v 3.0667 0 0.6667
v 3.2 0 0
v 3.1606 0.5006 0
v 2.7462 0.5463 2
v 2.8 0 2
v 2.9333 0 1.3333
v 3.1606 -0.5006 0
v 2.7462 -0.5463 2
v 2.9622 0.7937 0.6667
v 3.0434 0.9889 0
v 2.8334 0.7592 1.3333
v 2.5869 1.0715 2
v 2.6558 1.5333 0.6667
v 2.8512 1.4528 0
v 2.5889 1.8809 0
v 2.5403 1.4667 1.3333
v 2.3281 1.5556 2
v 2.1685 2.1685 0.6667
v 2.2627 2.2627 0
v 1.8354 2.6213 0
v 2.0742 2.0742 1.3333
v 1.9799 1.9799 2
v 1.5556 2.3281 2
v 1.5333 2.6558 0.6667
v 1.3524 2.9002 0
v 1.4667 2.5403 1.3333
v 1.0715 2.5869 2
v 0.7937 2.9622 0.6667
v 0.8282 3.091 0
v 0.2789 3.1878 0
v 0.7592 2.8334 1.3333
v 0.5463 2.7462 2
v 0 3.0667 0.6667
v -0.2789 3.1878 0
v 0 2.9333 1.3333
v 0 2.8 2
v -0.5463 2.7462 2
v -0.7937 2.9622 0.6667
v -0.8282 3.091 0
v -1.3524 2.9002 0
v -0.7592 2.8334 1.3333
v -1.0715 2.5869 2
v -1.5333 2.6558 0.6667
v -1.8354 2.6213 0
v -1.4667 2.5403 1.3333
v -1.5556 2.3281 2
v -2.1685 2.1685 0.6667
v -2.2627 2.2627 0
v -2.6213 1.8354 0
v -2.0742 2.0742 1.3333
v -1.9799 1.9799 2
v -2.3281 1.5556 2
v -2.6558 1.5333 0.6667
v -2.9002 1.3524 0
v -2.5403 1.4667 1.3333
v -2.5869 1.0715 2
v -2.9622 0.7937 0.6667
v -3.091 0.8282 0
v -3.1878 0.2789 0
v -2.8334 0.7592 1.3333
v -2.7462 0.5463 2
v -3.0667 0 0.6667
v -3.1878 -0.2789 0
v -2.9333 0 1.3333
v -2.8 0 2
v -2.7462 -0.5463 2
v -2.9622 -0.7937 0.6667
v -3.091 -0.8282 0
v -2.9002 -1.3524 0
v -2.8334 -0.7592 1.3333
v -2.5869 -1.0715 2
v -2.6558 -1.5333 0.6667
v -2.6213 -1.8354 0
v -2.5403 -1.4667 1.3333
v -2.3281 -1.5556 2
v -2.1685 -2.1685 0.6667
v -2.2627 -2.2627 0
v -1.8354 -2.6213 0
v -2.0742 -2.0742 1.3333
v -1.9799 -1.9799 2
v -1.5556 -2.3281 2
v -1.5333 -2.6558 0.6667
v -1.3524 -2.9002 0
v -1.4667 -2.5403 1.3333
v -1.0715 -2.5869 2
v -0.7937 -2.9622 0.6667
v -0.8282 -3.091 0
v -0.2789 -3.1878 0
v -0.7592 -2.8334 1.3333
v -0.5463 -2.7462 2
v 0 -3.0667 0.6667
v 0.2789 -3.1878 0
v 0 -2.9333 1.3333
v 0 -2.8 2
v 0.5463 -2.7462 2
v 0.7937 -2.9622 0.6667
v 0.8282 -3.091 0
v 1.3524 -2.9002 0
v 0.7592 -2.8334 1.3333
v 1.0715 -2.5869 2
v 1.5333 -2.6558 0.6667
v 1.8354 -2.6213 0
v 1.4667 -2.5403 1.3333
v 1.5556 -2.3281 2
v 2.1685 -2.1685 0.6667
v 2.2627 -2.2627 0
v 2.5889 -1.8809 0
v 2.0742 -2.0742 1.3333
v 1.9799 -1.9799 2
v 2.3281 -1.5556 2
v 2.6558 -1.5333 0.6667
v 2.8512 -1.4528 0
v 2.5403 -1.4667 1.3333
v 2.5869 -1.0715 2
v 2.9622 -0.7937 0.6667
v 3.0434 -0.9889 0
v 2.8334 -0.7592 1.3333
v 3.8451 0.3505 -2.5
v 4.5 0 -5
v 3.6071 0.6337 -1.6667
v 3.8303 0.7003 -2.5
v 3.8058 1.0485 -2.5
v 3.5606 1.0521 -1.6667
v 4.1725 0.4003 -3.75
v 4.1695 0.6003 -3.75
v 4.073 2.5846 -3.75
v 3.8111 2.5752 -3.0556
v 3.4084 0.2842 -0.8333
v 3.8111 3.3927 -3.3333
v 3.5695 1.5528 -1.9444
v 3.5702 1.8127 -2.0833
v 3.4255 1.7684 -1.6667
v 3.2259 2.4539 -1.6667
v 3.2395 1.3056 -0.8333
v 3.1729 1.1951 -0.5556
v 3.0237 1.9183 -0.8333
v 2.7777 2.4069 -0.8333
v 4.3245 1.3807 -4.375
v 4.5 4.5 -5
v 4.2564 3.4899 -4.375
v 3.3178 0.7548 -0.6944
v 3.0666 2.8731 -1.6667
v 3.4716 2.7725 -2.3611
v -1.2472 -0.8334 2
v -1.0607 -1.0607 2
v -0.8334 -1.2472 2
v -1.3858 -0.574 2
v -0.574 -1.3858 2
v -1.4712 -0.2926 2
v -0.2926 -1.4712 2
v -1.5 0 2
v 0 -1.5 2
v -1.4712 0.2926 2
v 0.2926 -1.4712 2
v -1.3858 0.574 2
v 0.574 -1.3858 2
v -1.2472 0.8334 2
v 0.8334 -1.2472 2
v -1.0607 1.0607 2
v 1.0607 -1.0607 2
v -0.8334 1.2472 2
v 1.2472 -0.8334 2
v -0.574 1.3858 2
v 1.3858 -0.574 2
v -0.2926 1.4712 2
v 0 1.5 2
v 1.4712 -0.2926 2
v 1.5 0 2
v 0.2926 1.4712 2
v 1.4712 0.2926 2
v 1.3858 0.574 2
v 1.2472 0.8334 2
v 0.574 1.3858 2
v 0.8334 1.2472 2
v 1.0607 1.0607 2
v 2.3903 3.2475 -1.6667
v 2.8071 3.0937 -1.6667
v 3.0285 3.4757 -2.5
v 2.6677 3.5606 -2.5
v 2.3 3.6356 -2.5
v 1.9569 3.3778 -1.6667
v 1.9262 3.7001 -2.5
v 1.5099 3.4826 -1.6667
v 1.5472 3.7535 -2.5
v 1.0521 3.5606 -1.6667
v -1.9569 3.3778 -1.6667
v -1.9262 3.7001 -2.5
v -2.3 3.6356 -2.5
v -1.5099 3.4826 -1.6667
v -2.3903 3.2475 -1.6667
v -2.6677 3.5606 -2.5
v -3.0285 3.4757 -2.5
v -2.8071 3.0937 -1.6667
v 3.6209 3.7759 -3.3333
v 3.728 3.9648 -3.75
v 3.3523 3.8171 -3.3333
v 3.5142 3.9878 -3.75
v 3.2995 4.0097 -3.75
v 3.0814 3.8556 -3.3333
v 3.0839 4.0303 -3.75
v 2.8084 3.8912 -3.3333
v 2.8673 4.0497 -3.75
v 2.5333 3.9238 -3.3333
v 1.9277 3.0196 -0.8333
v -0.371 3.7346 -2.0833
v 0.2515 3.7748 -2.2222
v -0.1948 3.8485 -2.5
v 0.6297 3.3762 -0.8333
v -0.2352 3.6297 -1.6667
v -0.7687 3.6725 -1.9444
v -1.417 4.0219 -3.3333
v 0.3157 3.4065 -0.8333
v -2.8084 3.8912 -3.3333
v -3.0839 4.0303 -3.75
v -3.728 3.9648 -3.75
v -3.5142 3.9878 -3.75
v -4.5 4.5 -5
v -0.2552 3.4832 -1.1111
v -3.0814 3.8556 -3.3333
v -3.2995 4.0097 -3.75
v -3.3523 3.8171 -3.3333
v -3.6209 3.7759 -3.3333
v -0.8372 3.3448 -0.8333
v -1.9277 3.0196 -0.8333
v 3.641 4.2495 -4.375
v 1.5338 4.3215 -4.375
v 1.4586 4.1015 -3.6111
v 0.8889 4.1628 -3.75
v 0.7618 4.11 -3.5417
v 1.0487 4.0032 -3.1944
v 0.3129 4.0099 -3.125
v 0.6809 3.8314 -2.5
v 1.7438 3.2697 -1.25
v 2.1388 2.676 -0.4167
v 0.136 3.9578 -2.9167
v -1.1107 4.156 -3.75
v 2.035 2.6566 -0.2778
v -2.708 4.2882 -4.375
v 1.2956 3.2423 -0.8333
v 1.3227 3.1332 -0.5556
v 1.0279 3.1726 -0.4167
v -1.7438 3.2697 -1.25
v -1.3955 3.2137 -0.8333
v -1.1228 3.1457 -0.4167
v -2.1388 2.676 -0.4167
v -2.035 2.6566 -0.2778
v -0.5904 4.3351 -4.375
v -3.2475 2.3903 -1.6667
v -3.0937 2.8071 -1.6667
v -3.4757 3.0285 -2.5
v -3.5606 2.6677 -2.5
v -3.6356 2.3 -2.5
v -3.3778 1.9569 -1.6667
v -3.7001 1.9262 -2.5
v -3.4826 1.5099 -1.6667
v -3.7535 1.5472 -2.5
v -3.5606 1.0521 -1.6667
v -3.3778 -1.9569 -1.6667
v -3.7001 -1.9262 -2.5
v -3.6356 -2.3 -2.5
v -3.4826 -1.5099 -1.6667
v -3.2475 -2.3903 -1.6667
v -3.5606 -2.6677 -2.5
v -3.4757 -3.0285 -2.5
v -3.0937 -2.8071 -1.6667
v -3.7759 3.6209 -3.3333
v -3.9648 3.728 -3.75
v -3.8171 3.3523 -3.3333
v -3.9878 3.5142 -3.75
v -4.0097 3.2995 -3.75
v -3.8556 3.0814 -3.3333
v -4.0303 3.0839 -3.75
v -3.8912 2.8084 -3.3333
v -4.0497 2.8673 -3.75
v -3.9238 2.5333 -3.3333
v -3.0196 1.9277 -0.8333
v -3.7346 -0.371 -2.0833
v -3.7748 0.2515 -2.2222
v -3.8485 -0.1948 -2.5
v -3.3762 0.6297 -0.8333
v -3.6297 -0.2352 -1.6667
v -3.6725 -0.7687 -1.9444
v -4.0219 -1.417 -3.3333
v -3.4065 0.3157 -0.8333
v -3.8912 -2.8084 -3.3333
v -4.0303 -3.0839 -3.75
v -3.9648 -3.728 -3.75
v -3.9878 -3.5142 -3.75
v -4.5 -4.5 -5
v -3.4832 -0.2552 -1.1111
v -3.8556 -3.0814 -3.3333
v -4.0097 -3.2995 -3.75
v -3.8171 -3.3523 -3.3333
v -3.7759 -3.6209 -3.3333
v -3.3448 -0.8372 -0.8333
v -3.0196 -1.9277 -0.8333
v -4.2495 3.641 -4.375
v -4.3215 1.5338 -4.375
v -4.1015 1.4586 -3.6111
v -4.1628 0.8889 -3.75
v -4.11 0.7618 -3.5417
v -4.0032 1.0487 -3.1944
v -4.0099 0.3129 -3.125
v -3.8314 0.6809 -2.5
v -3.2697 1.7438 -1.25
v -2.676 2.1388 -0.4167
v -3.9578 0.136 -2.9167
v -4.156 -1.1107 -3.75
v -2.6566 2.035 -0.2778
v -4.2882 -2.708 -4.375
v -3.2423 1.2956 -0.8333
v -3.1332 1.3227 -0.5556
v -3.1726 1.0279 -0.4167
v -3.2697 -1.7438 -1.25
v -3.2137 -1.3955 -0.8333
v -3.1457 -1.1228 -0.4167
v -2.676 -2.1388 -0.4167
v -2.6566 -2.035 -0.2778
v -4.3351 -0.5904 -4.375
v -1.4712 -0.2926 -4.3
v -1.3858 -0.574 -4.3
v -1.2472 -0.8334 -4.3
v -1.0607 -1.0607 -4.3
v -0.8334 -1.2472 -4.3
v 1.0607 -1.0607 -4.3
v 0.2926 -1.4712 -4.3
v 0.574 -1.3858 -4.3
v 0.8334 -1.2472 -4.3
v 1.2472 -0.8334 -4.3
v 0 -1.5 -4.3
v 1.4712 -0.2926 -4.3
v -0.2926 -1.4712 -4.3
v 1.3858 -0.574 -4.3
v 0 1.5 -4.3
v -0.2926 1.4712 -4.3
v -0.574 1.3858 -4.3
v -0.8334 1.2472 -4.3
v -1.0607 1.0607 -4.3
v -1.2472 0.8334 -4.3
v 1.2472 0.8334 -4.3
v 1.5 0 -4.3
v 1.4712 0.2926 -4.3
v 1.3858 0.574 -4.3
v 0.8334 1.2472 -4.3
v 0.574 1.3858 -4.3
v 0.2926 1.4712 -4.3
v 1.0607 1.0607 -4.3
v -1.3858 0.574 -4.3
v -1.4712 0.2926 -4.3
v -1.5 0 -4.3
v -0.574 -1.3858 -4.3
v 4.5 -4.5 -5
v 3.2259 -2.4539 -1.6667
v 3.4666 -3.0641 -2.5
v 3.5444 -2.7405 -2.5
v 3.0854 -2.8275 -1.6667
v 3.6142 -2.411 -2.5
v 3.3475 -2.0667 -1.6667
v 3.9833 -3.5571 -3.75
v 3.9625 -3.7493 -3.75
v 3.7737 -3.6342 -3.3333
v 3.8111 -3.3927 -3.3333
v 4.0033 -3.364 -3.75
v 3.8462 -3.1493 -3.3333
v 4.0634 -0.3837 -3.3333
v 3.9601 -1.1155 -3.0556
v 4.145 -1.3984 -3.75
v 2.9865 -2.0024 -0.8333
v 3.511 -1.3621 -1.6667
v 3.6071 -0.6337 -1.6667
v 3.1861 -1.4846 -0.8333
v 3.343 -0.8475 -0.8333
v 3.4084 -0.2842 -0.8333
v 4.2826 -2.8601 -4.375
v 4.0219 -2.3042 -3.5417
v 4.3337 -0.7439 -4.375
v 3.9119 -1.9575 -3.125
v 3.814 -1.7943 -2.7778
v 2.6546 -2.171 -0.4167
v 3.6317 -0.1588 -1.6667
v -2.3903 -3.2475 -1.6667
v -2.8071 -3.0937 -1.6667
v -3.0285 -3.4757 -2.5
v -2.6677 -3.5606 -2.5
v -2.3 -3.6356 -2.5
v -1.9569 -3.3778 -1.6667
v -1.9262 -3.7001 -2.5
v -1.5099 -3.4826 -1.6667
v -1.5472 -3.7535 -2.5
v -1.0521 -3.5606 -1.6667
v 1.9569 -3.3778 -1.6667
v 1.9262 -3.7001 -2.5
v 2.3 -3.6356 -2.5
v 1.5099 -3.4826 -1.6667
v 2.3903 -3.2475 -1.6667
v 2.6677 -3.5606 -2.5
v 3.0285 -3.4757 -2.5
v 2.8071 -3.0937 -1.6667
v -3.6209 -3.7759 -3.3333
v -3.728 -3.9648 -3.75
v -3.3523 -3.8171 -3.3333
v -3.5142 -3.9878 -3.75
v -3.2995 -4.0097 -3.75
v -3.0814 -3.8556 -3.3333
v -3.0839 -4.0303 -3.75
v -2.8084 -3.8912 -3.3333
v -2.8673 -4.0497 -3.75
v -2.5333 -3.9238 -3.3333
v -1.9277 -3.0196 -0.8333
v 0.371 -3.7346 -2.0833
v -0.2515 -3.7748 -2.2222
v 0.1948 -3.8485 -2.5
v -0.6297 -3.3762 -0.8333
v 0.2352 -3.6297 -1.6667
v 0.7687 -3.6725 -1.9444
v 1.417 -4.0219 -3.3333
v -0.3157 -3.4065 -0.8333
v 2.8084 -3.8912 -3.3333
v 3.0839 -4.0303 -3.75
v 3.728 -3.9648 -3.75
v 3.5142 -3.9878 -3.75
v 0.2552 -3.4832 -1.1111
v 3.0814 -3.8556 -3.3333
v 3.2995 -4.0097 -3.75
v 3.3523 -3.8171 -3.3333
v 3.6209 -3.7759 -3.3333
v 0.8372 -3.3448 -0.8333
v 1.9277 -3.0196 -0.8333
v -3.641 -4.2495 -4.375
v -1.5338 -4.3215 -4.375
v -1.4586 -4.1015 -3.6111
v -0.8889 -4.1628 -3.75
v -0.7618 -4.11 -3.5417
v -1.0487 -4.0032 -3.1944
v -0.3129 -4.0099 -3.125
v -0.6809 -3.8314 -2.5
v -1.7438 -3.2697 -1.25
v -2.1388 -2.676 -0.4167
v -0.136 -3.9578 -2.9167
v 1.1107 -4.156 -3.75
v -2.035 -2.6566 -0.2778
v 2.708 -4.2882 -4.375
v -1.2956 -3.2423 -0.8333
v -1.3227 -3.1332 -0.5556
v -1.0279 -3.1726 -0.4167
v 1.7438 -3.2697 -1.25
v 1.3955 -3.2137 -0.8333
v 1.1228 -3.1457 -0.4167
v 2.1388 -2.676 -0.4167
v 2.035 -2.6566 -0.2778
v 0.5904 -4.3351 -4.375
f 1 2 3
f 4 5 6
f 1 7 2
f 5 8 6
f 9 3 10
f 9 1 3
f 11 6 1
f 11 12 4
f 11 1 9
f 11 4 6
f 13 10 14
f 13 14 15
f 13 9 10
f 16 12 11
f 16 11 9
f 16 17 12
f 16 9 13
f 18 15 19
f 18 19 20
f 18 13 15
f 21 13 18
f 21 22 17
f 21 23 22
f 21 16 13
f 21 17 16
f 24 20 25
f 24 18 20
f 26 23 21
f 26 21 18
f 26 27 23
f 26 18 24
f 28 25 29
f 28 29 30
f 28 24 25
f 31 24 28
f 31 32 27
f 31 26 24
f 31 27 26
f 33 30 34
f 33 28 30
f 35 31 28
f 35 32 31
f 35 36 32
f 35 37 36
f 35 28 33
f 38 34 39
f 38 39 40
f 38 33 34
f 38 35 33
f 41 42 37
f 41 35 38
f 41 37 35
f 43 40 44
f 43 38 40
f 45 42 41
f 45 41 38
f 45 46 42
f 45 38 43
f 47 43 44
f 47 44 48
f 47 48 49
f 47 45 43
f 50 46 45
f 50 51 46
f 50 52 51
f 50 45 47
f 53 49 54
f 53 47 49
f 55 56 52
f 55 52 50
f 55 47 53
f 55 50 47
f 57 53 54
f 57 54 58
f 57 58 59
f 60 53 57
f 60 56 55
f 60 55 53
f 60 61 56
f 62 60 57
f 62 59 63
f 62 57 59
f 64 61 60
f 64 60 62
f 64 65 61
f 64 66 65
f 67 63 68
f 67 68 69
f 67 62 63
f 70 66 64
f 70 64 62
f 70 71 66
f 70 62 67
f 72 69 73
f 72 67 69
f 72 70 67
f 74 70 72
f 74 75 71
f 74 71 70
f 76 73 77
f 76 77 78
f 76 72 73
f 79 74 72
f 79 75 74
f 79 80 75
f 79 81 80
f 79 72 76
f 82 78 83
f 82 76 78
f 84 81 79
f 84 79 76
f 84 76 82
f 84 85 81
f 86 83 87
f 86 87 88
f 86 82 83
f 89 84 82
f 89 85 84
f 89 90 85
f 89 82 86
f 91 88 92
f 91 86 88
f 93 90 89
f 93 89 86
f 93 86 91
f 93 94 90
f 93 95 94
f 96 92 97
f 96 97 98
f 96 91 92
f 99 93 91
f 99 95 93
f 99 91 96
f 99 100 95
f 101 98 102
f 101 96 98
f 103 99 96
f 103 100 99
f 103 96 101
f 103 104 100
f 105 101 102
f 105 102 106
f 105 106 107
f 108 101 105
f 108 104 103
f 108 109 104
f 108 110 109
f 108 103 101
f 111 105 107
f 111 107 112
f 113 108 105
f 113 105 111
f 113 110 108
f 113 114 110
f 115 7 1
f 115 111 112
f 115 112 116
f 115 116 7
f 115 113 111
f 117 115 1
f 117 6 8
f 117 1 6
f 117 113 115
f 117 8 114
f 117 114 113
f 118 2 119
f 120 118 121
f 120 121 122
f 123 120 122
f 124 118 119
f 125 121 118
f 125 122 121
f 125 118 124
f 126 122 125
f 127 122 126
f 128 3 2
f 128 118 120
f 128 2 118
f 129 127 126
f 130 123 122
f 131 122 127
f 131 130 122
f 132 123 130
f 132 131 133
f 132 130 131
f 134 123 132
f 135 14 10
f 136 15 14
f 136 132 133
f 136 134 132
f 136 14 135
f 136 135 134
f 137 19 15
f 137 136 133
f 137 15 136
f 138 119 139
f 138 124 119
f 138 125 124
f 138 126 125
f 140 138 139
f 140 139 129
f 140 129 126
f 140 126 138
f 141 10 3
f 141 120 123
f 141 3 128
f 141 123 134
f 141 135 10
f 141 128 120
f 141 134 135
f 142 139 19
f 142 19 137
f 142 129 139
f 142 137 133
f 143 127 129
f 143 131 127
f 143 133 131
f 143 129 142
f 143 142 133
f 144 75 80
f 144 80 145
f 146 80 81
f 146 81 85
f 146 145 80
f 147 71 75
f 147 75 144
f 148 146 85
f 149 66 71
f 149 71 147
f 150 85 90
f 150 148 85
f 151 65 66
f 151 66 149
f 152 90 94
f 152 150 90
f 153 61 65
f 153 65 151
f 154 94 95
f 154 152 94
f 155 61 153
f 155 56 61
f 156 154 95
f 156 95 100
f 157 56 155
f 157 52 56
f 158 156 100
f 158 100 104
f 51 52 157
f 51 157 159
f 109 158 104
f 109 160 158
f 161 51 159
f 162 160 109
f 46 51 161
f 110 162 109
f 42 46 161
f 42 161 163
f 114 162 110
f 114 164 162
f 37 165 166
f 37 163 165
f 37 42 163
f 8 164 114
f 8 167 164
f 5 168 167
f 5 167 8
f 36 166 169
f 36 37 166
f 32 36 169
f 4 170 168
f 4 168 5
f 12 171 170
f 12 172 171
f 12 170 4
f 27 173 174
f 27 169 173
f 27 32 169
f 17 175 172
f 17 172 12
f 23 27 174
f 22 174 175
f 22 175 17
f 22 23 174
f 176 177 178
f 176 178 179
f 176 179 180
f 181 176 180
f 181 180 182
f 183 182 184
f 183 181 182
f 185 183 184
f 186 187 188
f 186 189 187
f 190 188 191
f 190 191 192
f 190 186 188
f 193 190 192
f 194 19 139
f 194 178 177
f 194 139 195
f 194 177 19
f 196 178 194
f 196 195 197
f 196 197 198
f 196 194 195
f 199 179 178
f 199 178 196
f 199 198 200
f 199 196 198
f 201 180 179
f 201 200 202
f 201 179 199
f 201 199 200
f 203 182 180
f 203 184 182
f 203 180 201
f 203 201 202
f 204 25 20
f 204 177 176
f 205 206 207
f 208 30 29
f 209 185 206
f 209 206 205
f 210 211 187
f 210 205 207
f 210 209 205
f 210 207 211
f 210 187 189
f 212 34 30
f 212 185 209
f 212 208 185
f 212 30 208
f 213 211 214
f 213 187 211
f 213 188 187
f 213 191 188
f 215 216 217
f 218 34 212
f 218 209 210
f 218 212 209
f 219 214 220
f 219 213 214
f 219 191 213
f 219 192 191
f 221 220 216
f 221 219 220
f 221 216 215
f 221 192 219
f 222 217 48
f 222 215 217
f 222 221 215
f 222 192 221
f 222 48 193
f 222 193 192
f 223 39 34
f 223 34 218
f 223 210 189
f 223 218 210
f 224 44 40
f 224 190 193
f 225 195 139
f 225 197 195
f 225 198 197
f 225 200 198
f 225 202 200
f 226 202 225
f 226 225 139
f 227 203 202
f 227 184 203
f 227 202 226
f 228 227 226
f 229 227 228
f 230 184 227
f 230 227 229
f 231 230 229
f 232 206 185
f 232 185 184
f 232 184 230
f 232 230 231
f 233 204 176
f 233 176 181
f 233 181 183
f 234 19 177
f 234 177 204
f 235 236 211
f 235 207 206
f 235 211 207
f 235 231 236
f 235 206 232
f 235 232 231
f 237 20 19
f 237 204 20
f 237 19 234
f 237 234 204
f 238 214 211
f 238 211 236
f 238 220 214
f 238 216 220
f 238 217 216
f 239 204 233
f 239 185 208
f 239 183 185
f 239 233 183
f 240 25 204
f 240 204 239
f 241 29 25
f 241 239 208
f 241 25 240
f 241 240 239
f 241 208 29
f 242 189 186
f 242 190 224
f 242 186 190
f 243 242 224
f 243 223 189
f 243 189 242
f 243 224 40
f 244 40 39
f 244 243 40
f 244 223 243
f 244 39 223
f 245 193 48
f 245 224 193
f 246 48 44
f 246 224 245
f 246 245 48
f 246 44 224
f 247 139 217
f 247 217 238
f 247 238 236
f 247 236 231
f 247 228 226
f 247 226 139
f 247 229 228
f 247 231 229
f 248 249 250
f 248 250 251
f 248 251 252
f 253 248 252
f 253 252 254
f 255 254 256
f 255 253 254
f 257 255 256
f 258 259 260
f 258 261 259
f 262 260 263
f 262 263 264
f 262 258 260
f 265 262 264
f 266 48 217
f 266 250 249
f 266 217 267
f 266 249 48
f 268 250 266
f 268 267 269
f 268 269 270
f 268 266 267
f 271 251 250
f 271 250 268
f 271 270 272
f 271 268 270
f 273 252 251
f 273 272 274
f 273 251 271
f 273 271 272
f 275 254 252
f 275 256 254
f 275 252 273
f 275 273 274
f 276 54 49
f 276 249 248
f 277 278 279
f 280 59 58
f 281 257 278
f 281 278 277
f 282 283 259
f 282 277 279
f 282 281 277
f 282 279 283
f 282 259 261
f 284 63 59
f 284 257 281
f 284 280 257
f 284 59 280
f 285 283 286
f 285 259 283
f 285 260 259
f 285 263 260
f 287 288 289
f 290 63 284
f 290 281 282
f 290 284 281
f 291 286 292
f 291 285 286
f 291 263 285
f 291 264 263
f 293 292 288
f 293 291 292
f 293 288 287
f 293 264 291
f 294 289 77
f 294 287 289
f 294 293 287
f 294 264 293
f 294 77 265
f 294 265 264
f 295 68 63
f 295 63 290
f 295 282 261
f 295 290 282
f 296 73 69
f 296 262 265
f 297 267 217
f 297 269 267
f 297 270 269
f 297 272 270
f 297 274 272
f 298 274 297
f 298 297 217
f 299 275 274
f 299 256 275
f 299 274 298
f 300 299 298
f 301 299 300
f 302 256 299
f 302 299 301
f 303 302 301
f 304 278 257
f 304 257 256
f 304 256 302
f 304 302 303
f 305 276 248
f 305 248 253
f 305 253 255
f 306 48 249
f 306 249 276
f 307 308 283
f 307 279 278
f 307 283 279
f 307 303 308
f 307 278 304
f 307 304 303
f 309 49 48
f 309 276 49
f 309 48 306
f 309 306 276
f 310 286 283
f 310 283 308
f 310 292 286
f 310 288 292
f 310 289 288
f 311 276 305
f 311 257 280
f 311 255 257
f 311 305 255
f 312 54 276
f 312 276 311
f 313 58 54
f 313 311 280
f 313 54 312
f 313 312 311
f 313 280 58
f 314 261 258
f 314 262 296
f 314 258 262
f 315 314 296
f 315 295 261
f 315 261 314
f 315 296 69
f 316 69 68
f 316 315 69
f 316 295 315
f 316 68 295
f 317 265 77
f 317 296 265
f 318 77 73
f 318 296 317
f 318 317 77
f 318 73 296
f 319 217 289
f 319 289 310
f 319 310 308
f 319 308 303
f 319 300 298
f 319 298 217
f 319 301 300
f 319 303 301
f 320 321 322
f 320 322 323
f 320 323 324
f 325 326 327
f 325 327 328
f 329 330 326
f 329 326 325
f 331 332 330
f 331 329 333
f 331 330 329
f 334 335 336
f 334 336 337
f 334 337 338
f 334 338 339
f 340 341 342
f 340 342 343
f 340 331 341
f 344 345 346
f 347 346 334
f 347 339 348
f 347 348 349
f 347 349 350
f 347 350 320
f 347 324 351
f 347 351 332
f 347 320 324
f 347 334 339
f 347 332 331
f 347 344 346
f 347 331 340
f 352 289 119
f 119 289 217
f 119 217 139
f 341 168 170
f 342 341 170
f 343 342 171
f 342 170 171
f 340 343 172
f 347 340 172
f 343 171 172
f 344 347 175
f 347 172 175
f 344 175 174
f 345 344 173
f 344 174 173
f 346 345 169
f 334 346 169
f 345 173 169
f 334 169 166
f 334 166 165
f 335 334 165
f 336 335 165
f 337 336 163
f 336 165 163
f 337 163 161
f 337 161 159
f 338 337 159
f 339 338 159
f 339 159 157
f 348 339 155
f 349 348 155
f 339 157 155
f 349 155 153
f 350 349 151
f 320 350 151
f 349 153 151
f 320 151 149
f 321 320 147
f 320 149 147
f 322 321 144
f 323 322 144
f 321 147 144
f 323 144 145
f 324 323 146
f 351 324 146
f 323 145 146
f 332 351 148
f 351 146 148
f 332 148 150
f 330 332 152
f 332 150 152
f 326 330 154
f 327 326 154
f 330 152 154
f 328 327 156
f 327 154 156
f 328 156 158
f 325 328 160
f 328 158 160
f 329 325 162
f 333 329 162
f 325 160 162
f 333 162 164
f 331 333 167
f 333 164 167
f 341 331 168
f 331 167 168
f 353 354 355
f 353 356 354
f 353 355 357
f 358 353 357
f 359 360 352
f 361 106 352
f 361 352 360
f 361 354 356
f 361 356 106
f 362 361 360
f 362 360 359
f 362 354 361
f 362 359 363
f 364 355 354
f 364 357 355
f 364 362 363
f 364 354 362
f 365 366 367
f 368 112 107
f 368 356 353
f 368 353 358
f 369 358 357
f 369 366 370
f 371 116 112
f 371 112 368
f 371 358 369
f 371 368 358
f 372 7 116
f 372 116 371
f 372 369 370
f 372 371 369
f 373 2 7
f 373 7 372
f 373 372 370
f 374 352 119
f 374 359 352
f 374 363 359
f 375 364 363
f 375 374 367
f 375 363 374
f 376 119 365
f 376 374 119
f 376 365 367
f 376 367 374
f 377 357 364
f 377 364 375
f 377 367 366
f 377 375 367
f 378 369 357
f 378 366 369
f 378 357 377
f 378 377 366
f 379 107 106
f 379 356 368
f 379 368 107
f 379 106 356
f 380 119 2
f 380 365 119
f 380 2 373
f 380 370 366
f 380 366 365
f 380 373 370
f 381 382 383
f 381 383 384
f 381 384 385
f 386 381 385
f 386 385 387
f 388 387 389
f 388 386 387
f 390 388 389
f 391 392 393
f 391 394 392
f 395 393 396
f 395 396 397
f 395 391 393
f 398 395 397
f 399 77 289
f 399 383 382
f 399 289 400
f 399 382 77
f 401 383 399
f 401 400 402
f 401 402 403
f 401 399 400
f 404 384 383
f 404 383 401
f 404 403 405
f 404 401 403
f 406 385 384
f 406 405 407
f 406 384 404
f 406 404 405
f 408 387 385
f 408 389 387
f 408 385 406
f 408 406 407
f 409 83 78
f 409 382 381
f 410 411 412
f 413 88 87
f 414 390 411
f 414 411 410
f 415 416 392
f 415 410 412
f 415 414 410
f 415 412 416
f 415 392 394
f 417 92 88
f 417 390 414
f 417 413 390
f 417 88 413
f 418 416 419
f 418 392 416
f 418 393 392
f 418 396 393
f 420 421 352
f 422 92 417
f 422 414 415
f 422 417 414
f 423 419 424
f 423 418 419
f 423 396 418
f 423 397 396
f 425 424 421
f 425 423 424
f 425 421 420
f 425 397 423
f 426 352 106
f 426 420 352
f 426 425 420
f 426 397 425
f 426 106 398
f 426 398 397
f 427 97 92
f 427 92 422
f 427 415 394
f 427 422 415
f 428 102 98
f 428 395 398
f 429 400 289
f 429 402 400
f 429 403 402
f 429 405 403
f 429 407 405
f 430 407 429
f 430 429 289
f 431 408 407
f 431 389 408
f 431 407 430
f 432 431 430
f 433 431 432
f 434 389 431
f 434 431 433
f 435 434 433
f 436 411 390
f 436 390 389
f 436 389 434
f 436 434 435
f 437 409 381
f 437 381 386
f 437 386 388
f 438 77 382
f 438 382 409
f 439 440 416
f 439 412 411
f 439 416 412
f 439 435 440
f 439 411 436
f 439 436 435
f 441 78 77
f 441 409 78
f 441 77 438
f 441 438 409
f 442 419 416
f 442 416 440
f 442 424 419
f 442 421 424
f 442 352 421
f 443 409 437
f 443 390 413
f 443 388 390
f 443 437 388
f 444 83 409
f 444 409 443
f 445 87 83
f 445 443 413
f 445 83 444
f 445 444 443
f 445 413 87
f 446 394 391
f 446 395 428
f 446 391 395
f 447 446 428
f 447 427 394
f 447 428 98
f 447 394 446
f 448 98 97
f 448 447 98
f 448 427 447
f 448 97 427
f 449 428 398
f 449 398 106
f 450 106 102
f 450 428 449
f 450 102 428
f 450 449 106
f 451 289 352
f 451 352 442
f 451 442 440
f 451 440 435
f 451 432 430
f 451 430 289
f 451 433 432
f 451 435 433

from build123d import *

# Parameters (mm, degrees)
F2_W     = 9
F2_H     = 9
F0_R     = 3.2
F5_R     = 2.8
F7_R     = 1.5
F8_DEPTH = 6.3


with BuildPart() as f3:
    # F2 (on offset) → F3 section 0
    with BuildSketch(Plane.XY.offset(-5)):
        Rectangle(F2_W, F2_H)
    # F0 (on Top) → F3 section 1
    with BuildSketch(Plane.XY):
        Circle(F0_R)
    loft()

    # F0 (on Top) → F6 section 0
    with BuildSketch(Plane.XY):
        Circle(F0_R)
    # F5 (on offset) → F6 section 1
    with BuildSketch(Plane.XY.offset(2)):
        Circle(F5_R)
    loft()

    # F7 (on offset) → F8 (cut)
    with BuildSketch(Plane.XY.offset(2)):
        Circle(F7_R)
    extrude(amount=-F8_DEPTH, mode=Mode.SUBTRACT)


solid = f3.part
